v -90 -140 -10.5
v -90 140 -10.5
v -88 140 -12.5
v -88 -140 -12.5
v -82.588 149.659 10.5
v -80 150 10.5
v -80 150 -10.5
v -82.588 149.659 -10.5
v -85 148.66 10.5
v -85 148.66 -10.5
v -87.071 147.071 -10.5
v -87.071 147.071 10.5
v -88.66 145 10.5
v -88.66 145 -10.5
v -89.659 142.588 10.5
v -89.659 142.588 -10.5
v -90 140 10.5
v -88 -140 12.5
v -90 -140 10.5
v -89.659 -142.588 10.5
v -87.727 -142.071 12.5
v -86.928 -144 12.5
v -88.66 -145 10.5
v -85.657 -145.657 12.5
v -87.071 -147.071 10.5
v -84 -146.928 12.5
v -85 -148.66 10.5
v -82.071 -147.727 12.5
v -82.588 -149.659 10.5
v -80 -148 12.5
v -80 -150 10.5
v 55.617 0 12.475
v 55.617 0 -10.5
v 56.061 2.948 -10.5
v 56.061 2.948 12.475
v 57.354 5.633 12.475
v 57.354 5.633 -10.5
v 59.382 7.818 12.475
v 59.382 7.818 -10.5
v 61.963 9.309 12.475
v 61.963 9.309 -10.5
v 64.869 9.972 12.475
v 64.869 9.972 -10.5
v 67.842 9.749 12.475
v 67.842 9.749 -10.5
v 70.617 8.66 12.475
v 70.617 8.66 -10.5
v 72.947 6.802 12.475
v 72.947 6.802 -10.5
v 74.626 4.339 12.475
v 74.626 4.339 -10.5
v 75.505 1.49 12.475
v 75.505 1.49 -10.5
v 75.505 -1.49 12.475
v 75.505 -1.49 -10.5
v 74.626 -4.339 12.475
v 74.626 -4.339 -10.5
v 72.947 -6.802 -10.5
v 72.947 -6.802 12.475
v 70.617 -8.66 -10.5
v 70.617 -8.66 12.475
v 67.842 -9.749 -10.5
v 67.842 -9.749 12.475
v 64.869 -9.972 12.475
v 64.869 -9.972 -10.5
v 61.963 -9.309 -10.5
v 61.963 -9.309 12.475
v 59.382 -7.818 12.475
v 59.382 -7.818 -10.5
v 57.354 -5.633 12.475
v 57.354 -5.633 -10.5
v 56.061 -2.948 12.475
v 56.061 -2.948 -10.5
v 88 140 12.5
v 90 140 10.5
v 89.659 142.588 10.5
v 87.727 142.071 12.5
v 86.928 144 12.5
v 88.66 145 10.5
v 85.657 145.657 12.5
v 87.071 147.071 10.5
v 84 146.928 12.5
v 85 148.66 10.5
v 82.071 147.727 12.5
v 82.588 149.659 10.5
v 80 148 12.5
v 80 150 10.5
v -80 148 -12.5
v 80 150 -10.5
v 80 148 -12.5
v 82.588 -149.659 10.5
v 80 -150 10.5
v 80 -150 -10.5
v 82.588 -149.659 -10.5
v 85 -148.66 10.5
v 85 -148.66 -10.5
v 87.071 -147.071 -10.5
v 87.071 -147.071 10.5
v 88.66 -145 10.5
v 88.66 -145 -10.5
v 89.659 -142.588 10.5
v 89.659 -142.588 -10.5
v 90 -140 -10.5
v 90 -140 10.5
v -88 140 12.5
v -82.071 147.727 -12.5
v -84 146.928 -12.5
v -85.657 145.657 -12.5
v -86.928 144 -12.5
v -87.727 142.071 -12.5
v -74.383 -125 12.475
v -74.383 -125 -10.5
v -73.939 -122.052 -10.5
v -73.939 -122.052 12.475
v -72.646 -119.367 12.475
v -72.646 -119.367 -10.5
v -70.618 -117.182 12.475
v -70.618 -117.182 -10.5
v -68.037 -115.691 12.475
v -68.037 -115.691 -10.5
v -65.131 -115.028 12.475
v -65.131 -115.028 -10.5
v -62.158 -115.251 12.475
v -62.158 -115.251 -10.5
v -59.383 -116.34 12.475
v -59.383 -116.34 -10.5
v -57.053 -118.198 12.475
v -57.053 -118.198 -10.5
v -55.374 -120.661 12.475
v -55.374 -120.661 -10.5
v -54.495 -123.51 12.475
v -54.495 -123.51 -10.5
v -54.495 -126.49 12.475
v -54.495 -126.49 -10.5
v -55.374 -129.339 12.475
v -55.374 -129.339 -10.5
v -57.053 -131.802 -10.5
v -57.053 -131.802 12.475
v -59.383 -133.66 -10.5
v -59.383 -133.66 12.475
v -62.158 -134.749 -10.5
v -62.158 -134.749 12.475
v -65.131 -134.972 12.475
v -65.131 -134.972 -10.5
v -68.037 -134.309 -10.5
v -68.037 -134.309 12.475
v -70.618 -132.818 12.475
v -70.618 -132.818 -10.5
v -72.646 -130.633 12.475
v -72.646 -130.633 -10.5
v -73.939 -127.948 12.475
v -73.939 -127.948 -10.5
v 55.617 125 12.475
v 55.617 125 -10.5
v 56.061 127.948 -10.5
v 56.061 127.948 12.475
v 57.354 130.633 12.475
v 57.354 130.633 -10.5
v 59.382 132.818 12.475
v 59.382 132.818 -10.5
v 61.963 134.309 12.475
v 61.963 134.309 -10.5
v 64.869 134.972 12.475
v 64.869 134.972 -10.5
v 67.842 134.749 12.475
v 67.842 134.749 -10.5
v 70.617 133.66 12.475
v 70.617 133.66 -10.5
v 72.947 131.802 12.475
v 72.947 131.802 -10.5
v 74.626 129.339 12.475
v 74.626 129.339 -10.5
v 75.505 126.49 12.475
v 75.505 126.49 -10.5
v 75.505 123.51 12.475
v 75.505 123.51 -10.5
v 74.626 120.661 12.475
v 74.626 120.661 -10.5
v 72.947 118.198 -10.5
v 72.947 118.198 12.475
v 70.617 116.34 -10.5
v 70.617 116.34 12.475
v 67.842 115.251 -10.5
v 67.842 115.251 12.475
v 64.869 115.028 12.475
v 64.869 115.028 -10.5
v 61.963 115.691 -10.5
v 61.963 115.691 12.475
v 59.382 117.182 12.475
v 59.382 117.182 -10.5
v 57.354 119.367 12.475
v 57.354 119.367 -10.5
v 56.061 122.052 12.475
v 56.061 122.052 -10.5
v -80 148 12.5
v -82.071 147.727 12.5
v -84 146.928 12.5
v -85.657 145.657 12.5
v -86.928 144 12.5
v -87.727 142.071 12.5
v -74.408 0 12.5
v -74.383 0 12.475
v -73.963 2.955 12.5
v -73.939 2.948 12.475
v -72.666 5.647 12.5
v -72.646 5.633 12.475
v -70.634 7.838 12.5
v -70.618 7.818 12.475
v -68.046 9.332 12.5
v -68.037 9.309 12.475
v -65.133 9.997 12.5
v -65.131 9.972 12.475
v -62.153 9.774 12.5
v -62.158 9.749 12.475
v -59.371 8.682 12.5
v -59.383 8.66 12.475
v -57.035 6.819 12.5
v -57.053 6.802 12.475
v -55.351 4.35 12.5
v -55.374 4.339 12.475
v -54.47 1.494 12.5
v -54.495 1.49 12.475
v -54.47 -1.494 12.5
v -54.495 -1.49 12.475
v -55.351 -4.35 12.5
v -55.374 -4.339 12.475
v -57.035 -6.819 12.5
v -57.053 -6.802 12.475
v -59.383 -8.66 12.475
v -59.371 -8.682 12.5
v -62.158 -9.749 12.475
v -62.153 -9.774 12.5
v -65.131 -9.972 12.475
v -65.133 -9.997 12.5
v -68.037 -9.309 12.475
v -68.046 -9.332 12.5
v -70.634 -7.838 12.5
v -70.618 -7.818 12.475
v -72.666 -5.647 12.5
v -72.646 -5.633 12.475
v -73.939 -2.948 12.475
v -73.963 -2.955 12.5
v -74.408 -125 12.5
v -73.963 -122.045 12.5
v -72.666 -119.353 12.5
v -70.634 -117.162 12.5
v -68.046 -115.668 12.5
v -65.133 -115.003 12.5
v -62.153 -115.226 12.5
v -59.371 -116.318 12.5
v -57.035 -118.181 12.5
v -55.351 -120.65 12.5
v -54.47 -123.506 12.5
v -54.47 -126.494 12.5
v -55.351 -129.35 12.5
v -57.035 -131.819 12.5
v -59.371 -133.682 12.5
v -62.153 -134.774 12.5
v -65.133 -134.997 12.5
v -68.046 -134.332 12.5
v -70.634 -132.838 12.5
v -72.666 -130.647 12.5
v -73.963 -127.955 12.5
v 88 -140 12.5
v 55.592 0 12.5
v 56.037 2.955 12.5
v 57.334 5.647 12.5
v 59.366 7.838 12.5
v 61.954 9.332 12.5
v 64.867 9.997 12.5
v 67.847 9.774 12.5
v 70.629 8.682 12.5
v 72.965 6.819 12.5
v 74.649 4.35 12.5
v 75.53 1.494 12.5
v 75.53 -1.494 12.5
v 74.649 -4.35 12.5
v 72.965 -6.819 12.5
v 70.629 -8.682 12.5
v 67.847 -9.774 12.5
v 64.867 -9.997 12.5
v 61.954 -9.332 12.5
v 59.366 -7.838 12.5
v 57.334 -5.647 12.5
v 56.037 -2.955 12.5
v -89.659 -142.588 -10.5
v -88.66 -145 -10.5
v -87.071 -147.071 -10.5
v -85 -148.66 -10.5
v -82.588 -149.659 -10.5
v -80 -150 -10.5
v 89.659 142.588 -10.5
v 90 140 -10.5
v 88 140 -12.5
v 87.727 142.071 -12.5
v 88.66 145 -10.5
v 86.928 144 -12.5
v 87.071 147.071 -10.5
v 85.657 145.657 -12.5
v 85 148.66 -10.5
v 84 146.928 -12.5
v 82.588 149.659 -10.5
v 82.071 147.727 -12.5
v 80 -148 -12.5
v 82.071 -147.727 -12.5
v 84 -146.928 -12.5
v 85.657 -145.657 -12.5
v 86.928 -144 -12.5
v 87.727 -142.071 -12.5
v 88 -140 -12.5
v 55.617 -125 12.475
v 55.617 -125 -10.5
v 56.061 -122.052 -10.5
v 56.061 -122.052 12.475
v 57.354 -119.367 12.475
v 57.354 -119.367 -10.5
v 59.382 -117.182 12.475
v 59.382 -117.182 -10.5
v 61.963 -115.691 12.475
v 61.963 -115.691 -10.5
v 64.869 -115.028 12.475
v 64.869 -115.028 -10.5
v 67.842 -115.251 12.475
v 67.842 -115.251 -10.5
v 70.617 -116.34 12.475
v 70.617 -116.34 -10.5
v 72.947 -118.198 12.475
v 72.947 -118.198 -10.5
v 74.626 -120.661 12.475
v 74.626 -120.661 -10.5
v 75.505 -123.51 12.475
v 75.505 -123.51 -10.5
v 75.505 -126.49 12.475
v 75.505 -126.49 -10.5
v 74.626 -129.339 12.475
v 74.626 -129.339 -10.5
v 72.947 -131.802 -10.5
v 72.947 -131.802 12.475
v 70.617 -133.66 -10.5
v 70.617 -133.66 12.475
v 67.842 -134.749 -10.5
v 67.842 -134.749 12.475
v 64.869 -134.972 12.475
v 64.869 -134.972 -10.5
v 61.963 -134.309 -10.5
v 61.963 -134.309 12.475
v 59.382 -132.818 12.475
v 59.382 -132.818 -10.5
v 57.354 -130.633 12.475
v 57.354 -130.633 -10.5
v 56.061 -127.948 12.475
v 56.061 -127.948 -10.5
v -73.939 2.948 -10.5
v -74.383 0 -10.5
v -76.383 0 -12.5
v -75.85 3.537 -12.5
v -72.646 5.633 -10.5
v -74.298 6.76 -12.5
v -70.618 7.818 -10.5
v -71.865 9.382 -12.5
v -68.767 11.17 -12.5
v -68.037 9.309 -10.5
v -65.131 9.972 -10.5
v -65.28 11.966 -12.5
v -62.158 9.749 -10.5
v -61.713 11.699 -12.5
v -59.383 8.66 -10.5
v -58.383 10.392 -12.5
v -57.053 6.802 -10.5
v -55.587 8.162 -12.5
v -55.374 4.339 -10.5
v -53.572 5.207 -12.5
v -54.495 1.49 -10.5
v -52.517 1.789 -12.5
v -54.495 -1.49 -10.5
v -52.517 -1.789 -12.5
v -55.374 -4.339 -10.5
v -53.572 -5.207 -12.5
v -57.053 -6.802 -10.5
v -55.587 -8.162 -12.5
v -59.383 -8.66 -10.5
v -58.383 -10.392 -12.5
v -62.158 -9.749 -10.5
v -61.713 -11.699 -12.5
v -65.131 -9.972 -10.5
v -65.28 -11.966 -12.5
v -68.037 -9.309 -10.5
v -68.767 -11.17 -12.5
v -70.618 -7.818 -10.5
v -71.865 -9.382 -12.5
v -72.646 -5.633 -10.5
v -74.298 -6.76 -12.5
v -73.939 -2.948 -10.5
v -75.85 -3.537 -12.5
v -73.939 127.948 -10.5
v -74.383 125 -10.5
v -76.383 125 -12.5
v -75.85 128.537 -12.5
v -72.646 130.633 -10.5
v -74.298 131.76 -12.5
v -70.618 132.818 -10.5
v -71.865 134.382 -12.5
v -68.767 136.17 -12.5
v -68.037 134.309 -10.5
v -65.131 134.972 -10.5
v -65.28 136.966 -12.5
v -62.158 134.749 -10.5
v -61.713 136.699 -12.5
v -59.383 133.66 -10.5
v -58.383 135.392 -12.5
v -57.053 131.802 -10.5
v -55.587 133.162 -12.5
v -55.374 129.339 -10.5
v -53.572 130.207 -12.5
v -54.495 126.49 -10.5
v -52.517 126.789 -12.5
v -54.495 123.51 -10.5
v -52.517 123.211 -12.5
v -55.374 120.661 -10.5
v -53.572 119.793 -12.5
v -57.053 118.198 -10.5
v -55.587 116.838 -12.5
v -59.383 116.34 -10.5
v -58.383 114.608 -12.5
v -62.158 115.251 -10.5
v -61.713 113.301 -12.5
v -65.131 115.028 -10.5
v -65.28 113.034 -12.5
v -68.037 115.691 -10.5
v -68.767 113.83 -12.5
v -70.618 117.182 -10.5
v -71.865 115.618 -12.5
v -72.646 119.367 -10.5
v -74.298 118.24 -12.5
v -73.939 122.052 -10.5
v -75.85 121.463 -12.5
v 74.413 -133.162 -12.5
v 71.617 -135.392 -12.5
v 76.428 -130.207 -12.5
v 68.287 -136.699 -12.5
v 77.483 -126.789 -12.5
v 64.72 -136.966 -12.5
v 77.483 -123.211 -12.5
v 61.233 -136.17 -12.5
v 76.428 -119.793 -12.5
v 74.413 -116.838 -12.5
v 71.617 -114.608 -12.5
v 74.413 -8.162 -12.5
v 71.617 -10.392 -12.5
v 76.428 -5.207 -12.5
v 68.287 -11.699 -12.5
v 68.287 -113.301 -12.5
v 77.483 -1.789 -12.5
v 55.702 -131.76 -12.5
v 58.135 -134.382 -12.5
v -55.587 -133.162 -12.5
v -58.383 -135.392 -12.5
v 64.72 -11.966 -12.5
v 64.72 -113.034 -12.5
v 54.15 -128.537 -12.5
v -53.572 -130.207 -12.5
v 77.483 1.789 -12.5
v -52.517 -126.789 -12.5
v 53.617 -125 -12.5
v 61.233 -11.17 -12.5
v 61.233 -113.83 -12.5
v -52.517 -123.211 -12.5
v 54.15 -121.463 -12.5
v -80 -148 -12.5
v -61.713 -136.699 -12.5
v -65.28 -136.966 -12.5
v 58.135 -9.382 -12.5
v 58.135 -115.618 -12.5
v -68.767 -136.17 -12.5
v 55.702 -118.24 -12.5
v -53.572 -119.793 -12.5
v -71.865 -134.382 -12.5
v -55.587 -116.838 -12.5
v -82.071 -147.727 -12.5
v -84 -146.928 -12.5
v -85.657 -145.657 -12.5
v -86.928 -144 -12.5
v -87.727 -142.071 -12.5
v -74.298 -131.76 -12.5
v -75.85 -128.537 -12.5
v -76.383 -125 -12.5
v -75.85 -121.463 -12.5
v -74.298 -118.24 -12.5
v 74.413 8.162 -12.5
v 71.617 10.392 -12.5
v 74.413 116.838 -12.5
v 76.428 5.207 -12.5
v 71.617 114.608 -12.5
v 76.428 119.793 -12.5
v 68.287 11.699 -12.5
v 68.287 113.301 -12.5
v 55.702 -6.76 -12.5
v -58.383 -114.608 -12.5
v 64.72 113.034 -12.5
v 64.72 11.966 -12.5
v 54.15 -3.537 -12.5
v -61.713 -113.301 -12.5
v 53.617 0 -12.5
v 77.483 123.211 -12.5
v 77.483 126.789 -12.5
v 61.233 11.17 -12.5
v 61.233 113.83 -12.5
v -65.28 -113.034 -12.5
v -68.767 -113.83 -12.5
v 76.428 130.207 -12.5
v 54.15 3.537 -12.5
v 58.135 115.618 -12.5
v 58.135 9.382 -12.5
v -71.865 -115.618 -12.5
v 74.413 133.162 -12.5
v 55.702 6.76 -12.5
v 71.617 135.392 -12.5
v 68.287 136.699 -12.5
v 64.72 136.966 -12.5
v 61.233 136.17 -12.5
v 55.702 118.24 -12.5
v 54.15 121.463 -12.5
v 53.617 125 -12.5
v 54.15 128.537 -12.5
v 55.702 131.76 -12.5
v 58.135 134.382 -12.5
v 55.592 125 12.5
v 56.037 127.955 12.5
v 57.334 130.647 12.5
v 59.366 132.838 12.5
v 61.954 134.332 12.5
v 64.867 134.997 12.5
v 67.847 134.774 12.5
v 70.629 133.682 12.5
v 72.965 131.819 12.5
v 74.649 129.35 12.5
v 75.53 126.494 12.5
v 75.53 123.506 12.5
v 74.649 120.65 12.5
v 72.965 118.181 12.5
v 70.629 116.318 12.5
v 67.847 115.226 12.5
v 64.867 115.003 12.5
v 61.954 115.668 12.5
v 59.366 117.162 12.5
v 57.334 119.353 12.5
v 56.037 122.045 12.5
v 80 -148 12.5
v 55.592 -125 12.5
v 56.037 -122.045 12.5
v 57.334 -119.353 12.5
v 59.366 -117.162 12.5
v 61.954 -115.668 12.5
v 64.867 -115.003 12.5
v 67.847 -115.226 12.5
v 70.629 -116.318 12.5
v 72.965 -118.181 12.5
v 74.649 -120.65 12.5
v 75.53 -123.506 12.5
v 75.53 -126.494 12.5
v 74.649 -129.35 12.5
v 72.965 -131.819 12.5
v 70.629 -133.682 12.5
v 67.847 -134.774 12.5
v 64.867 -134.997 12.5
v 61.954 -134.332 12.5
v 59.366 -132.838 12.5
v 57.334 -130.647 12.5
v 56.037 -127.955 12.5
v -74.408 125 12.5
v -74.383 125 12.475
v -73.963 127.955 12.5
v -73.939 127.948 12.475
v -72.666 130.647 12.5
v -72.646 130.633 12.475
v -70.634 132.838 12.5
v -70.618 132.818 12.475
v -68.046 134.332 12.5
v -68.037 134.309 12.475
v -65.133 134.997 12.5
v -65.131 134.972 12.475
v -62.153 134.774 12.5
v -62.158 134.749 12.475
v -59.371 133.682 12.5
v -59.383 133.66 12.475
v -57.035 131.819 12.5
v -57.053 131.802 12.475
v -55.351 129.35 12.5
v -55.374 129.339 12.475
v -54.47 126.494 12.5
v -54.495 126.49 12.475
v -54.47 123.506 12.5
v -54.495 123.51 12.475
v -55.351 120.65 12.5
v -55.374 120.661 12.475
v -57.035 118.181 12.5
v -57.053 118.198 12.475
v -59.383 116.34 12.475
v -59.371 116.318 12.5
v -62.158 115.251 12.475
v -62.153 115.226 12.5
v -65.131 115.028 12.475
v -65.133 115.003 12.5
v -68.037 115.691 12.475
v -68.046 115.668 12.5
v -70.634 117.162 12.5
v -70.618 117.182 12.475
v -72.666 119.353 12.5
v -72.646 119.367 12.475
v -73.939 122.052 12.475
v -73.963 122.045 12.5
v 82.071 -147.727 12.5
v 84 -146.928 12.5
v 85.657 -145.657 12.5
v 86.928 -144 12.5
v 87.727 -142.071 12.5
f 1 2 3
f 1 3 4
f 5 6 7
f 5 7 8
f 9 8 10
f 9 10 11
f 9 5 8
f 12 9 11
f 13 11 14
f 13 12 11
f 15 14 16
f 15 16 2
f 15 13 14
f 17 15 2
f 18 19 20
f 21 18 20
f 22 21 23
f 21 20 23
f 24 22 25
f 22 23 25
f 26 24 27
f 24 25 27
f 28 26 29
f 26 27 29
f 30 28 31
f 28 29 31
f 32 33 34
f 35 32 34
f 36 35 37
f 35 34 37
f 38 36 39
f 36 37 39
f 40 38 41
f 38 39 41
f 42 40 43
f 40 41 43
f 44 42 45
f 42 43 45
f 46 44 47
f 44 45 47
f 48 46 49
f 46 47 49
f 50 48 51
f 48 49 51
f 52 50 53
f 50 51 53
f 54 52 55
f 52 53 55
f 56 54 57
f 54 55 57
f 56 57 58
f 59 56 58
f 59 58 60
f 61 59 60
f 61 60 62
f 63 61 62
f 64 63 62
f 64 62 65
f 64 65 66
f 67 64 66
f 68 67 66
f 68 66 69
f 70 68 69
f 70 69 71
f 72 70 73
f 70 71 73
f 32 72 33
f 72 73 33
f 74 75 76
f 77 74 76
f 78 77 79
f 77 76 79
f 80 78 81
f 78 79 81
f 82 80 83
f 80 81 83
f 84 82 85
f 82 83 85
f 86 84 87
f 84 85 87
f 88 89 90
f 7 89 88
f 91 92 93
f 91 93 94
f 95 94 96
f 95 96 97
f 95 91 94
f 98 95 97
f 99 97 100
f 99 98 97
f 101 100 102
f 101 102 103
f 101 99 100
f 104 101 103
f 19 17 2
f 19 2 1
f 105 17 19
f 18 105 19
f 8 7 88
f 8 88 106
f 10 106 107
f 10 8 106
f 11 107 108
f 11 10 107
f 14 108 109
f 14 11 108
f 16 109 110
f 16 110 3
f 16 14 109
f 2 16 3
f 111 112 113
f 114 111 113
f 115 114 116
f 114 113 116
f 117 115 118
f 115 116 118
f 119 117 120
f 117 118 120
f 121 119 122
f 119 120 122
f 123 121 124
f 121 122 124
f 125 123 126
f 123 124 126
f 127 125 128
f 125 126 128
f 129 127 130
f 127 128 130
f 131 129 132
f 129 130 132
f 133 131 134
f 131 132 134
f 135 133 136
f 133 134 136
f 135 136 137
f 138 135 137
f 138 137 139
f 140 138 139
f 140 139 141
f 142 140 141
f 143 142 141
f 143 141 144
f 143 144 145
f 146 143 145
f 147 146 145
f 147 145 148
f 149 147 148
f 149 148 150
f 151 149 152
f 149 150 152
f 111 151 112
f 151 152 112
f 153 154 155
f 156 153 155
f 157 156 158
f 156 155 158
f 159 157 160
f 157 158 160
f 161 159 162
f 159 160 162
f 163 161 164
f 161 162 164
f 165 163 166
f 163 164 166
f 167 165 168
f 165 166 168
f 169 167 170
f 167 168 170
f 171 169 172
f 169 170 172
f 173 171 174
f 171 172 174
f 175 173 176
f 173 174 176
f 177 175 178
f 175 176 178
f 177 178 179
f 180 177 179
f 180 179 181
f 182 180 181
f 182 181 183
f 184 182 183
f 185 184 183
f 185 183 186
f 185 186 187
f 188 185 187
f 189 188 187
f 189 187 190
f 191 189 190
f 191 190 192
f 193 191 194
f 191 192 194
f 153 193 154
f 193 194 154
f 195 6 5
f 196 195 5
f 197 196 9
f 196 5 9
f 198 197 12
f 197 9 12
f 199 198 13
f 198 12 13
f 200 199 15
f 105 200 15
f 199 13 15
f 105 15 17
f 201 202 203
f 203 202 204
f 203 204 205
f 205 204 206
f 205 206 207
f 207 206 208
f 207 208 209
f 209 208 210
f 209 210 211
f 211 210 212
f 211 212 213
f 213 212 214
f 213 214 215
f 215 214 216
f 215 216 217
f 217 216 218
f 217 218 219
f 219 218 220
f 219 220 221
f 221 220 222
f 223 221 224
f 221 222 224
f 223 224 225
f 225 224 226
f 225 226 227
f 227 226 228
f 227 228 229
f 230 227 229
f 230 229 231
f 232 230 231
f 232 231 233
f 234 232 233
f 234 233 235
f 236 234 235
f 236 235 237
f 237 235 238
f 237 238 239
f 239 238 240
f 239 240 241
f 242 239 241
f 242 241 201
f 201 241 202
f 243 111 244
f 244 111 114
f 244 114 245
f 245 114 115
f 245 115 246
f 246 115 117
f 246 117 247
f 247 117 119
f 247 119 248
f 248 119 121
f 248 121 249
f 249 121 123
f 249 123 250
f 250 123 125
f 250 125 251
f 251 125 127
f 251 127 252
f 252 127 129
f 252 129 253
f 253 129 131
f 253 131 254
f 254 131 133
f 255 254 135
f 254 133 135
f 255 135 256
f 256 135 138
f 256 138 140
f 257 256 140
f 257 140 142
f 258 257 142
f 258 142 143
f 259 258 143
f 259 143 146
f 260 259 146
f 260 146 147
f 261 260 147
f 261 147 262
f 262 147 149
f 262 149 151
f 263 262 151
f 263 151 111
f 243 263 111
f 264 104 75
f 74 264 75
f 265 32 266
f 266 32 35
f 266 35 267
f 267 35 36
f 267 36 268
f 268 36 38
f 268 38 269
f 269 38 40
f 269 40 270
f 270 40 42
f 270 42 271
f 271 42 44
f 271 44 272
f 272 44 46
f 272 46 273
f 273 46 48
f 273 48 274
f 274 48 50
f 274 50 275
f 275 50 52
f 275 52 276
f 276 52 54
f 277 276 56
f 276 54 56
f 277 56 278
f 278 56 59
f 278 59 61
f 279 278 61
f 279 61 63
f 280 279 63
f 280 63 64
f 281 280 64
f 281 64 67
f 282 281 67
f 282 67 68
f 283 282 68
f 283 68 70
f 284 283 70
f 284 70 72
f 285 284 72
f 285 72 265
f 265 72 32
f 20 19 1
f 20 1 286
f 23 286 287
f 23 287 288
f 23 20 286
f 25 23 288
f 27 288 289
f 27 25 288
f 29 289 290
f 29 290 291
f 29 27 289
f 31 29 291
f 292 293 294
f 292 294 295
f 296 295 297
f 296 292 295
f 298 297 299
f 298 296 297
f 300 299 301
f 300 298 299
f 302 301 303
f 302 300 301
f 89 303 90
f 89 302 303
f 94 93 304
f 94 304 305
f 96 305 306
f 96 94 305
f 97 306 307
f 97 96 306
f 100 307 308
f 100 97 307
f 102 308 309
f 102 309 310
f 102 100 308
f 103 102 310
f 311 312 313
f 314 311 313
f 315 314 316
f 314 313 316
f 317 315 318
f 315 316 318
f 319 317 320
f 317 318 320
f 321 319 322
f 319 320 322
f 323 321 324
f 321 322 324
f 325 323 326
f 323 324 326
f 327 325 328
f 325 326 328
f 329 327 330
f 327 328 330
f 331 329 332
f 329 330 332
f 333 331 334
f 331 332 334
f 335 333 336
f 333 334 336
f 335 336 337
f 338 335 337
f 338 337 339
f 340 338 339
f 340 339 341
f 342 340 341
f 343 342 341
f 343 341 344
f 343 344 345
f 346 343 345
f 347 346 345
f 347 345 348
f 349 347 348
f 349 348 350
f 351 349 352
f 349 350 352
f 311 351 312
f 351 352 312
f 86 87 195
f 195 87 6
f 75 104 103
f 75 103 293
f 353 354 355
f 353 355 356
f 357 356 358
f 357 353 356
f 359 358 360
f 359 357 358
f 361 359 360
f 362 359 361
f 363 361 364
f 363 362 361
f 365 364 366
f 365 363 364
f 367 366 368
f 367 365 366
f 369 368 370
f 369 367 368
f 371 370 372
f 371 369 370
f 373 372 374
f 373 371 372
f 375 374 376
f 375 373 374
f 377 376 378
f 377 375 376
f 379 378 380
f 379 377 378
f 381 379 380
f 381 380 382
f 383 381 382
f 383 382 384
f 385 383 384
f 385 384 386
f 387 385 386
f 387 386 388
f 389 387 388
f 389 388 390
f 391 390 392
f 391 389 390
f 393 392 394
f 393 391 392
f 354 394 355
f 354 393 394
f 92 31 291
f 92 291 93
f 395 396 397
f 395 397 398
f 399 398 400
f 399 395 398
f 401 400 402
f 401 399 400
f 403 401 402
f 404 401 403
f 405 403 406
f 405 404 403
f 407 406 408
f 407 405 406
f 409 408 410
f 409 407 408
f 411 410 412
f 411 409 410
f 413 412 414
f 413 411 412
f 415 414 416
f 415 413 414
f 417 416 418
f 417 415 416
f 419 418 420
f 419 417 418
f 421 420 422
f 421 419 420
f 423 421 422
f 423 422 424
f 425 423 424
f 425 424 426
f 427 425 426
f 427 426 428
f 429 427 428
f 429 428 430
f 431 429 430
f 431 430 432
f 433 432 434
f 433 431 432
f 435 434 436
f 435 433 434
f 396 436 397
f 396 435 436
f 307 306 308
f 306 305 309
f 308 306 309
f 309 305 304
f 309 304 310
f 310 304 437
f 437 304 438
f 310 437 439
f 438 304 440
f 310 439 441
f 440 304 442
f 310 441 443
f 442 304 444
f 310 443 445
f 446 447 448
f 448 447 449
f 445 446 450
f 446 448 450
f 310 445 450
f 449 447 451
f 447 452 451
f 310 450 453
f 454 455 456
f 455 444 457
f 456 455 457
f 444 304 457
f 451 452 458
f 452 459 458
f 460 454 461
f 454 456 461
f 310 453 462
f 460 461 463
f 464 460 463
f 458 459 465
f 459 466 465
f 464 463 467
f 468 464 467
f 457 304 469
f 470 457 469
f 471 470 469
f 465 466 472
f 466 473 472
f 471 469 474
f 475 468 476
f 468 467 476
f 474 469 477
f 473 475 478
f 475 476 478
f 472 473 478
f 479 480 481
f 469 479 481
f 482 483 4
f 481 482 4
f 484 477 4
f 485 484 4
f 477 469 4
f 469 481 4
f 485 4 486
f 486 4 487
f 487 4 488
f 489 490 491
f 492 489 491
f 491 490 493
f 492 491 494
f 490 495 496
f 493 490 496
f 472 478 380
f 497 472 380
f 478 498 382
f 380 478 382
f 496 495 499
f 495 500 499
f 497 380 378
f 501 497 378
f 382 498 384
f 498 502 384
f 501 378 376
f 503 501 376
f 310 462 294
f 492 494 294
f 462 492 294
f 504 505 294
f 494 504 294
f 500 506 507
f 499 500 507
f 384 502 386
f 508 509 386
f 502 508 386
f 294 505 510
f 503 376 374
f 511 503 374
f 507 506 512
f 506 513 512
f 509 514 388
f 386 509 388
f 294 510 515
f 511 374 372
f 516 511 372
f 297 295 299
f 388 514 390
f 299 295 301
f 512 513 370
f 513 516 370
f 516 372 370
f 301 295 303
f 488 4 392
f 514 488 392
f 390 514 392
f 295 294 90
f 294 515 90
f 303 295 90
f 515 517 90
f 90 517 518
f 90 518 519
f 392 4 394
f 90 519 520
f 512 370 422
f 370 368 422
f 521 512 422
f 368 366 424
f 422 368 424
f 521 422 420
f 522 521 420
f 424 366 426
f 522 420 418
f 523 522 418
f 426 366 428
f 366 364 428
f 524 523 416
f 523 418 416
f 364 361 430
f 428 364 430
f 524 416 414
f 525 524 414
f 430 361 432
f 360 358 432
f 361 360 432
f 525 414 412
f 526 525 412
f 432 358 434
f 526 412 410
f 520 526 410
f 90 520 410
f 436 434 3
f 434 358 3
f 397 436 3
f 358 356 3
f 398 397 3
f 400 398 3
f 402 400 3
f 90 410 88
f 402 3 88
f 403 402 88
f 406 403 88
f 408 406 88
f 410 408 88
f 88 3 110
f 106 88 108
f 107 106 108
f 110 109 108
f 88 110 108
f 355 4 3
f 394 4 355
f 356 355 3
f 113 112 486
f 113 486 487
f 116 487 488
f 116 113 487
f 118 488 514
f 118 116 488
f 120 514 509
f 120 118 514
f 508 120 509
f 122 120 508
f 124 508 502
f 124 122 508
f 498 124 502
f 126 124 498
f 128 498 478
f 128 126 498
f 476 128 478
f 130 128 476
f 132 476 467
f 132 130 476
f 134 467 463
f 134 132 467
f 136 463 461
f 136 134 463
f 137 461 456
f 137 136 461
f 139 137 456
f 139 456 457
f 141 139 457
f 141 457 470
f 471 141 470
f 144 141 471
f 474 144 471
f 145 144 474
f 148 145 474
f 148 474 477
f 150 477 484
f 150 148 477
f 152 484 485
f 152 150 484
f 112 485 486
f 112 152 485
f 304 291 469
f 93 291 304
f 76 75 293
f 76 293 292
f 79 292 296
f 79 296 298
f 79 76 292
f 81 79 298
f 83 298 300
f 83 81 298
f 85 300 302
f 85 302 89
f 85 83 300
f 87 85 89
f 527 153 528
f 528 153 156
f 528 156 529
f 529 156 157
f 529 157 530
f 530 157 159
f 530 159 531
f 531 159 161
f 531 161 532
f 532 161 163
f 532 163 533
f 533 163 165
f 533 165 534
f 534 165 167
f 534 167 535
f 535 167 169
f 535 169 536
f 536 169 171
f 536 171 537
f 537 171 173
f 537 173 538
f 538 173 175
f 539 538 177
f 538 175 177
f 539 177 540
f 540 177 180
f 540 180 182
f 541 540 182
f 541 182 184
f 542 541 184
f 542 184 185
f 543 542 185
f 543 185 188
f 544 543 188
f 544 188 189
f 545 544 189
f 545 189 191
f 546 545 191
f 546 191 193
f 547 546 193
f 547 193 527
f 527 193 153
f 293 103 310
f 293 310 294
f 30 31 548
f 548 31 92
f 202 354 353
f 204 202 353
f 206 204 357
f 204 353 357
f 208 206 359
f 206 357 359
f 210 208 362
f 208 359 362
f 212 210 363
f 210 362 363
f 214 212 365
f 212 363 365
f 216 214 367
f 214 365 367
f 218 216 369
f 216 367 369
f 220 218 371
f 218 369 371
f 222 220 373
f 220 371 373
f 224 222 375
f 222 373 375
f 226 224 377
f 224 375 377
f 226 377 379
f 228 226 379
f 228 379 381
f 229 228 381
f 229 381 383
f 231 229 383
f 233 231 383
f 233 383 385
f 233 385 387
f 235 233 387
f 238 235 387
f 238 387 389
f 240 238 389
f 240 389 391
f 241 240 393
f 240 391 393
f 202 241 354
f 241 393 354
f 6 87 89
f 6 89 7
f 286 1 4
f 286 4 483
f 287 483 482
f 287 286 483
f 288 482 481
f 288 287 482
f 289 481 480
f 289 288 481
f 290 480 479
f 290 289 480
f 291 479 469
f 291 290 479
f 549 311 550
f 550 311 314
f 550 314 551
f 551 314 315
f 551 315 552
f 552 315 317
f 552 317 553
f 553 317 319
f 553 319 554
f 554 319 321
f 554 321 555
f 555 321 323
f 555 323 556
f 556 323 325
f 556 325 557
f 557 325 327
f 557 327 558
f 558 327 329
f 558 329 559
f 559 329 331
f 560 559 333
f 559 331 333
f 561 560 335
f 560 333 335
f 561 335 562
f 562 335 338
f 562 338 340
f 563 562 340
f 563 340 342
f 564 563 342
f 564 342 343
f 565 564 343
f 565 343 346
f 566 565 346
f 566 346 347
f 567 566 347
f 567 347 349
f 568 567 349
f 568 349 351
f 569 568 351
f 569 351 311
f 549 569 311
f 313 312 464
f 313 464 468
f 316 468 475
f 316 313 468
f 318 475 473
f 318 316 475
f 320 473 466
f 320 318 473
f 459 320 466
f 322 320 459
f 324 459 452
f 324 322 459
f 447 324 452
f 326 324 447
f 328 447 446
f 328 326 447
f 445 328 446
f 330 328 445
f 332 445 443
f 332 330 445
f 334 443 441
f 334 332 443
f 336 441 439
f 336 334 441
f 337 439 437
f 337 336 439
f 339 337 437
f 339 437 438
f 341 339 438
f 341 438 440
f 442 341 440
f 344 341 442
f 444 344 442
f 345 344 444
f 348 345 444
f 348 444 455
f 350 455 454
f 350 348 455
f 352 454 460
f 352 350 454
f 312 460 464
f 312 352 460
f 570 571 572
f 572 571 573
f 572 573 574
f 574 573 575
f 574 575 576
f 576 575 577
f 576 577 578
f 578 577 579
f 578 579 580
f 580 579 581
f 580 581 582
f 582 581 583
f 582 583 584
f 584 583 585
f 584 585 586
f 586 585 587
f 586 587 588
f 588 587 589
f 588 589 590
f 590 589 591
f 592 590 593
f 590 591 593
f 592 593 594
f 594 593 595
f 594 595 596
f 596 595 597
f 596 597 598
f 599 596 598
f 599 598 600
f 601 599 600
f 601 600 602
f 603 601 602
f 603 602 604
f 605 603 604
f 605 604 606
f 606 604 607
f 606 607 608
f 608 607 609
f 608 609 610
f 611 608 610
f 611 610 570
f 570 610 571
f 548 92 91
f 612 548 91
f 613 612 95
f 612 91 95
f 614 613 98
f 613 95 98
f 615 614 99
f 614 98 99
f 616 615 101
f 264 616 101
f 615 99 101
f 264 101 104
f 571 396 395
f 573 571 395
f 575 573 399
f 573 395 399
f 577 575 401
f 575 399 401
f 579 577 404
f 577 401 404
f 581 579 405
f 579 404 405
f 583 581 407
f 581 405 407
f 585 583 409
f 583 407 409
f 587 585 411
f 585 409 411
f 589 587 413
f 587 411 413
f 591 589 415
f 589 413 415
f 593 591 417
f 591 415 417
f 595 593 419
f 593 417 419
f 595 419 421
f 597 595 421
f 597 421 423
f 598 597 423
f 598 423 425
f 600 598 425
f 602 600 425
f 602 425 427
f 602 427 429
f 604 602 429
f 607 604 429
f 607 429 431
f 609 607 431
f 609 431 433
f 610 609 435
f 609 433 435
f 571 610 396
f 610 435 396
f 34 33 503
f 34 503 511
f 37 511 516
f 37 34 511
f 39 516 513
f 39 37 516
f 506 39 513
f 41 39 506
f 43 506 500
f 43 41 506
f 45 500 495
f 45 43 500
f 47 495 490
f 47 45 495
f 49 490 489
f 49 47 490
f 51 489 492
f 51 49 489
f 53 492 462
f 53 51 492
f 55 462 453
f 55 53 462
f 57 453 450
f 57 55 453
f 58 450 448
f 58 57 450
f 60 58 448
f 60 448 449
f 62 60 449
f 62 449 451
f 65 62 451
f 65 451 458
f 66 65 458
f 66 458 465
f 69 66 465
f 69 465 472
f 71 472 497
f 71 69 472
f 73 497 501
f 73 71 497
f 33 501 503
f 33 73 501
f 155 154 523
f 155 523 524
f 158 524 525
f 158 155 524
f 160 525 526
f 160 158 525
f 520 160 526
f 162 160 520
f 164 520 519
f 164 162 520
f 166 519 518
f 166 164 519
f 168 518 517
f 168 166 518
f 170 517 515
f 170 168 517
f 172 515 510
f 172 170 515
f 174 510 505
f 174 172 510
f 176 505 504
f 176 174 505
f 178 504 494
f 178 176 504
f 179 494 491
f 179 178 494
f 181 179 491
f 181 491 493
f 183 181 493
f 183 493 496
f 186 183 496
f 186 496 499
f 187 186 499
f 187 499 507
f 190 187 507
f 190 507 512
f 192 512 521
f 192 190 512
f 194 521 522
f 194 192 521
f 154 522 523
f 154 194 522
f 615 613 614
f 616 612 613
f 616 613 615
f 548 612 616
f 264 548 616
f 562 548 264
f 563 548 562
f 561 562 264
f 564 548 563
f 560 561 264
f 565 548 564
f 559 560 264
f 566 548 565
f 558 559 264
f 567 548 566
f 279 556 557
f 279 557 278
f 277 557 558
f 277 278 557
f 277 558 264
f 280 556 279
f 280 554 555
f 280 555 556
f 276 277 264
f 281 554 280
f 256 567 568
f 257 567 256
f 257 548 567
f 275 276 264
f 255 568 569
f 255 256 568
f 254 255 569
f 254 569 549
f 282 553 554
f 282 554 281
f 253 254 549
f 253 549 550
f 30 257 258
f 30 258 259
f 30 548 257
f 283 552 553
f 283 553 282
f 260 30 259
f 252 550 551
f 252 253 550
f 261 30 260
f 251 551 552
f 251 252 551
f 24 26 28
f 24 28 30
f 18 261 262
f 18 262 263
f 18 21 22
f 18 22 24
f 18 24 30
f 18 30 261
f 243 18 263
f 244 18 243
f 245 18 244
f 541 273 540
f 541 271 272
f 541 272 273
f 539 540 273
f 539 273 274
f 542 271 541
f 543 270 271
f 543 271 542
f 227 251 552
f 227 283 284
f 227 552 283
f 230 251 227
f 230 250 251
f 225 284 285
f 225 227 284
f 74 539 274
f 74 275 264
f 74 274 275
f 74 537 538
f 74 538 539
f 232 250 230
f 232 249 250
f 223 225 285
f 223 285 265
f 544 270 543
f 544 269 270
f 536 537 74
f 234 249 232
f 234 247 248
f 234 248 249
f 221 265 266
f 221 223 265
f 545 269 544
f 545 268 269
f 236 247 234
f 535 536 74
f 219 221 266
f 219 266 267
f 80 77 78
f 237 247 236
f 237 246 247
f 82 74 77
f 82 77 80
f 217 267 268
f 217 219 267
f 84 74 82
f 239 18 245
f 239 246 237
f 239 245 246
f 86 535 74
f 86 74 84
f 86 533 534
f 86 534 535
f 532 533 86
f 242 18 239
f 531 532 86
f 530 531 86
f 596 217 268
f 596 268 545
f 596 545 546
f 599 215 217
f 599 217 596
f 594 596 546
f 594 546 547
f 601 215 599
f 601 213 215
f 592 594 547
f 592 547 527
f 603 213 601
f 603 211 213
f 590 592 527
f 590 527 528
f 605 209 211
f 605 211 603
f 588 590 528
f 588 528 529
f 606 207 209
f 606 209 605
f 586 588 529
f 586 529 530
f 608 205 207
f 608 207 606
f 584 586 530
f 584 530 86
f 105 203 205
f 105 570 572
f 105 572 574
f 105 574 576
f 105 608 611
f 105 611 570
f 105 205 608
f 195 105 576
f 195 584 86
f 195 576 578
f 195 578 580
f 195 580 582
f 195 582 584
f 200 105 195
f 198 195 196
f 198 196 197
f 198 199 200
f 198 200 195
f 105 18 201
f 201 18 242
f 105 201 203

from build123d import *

# Parameters (mm, degrees)
BOSS_EXTRUDE1_DEPTH                  = 12.5
F_20_0_20_DIAMETER_HOLE1_D           = 20
F_20_0_20_DIAMETER_HOLE1_CSINK_D     = 20.05
F_20_0_20_DIAMETER_HOLE1_CSINK_ANGLE = 90
CHAMFER2_SIZE                        = 2
CHAMFER3_SIZE                        = 2


with BuildPart() as part:
    # Sketch2 → Boss-Extrude1 (new, symmetric)
    with BuildSketch(Plane(origin=(0, 0, 0), x_dir=(0, 1, 0), z_dir=(0, 0, 1))):
        with BuildLine():
            Line((-140, -90), (140, -90))
            ThreePointArc((140, -90), (147.071067812, -87.071067812), (150, -80))
            Line((150, -80), (150, 80))
            ThreePointArc((150, 80), (147.071067812, 87.071067812), (140, 90))
            Line((140, 90), (-140, 90))
            ThreePointArc((-140, 90), (-147.071067812, 87.071067812), (-150, 80))
            Line((-150, 80), (-150, -80))
            ThreePointArc((-150, -80), (-147.071067812, -87.071067812), (-140, -90))
        make_face()
    extrude(amount=BOSS_EXTRUDE1_DEPTH, both=True)

    # Ø20.0 (20) Diameter Hole1 (through all)
    with Locations(Plane(origin=(-64.383356152, -125, 12.5), x_dir=(1, 0, 0), z_dir=(0, 0, 1))):
        with Locations((0, 0), (0, 125), (0, 250), (130, 250), (130, 125), (130, 0)):
            CounterSinkHole(F_20_0_20_DIAMETER_HOLE1_D / 2, F_20_0_20_DIAMETER_HOLE1_CSINK_D / 2, counter_sink_angle=F_20_0_20_DIAMETER_HOLE1_CSINK_ANGLE)

    # Chamfer2
    chamfer2_edges = [part.edges().sort_by_distance(p)[0] for p in [
        (87.071067812, 147.071067812, 12.5),
        (0, 150, 12.5),
        (-87.071067812, 147.071067812, 12.5),
        (-90, 0, 12.5),
        (-87.071067812, -147.071067812, 12.5),
        (0, -150, 12.5),
        (87.071067812, -147.071067812, 12.5),
        (90, 0, 12.5),
    ]]
    chamfer(chamfer2_edges, length=CHAMFER2_SIZE)

    # Chamfer3
    chamfer3_edges = [part.edges().sort_by_distance(p)[0] for p in [
        (0, 150, -12.5),
        (87.071067812, 147.071067812, -12.5),
        (90, 0, -12.5),
        (87.071067812, -147.071067812, -12.5),
        (75.616643848, -125, -12.5),
        (75.616643848, 0, -12.5),
        (75.616643848, 125, -12.5),
        (-54.383356152, 125, -12.5),
        (-54.383356152, 0, -12.5),
        (-54.383356152, -125, -12.5),
        (0, -150, -12.5),
        (-87.071067812, -147.071067812, -12.5),
        (-90, 0, -12.5),
        (-87.071067812, 147.071067812, -12.5),
    ]]
    chamfer(chamfer3_edges, length=CHAMFER3_SIZE)


solid = part.part
